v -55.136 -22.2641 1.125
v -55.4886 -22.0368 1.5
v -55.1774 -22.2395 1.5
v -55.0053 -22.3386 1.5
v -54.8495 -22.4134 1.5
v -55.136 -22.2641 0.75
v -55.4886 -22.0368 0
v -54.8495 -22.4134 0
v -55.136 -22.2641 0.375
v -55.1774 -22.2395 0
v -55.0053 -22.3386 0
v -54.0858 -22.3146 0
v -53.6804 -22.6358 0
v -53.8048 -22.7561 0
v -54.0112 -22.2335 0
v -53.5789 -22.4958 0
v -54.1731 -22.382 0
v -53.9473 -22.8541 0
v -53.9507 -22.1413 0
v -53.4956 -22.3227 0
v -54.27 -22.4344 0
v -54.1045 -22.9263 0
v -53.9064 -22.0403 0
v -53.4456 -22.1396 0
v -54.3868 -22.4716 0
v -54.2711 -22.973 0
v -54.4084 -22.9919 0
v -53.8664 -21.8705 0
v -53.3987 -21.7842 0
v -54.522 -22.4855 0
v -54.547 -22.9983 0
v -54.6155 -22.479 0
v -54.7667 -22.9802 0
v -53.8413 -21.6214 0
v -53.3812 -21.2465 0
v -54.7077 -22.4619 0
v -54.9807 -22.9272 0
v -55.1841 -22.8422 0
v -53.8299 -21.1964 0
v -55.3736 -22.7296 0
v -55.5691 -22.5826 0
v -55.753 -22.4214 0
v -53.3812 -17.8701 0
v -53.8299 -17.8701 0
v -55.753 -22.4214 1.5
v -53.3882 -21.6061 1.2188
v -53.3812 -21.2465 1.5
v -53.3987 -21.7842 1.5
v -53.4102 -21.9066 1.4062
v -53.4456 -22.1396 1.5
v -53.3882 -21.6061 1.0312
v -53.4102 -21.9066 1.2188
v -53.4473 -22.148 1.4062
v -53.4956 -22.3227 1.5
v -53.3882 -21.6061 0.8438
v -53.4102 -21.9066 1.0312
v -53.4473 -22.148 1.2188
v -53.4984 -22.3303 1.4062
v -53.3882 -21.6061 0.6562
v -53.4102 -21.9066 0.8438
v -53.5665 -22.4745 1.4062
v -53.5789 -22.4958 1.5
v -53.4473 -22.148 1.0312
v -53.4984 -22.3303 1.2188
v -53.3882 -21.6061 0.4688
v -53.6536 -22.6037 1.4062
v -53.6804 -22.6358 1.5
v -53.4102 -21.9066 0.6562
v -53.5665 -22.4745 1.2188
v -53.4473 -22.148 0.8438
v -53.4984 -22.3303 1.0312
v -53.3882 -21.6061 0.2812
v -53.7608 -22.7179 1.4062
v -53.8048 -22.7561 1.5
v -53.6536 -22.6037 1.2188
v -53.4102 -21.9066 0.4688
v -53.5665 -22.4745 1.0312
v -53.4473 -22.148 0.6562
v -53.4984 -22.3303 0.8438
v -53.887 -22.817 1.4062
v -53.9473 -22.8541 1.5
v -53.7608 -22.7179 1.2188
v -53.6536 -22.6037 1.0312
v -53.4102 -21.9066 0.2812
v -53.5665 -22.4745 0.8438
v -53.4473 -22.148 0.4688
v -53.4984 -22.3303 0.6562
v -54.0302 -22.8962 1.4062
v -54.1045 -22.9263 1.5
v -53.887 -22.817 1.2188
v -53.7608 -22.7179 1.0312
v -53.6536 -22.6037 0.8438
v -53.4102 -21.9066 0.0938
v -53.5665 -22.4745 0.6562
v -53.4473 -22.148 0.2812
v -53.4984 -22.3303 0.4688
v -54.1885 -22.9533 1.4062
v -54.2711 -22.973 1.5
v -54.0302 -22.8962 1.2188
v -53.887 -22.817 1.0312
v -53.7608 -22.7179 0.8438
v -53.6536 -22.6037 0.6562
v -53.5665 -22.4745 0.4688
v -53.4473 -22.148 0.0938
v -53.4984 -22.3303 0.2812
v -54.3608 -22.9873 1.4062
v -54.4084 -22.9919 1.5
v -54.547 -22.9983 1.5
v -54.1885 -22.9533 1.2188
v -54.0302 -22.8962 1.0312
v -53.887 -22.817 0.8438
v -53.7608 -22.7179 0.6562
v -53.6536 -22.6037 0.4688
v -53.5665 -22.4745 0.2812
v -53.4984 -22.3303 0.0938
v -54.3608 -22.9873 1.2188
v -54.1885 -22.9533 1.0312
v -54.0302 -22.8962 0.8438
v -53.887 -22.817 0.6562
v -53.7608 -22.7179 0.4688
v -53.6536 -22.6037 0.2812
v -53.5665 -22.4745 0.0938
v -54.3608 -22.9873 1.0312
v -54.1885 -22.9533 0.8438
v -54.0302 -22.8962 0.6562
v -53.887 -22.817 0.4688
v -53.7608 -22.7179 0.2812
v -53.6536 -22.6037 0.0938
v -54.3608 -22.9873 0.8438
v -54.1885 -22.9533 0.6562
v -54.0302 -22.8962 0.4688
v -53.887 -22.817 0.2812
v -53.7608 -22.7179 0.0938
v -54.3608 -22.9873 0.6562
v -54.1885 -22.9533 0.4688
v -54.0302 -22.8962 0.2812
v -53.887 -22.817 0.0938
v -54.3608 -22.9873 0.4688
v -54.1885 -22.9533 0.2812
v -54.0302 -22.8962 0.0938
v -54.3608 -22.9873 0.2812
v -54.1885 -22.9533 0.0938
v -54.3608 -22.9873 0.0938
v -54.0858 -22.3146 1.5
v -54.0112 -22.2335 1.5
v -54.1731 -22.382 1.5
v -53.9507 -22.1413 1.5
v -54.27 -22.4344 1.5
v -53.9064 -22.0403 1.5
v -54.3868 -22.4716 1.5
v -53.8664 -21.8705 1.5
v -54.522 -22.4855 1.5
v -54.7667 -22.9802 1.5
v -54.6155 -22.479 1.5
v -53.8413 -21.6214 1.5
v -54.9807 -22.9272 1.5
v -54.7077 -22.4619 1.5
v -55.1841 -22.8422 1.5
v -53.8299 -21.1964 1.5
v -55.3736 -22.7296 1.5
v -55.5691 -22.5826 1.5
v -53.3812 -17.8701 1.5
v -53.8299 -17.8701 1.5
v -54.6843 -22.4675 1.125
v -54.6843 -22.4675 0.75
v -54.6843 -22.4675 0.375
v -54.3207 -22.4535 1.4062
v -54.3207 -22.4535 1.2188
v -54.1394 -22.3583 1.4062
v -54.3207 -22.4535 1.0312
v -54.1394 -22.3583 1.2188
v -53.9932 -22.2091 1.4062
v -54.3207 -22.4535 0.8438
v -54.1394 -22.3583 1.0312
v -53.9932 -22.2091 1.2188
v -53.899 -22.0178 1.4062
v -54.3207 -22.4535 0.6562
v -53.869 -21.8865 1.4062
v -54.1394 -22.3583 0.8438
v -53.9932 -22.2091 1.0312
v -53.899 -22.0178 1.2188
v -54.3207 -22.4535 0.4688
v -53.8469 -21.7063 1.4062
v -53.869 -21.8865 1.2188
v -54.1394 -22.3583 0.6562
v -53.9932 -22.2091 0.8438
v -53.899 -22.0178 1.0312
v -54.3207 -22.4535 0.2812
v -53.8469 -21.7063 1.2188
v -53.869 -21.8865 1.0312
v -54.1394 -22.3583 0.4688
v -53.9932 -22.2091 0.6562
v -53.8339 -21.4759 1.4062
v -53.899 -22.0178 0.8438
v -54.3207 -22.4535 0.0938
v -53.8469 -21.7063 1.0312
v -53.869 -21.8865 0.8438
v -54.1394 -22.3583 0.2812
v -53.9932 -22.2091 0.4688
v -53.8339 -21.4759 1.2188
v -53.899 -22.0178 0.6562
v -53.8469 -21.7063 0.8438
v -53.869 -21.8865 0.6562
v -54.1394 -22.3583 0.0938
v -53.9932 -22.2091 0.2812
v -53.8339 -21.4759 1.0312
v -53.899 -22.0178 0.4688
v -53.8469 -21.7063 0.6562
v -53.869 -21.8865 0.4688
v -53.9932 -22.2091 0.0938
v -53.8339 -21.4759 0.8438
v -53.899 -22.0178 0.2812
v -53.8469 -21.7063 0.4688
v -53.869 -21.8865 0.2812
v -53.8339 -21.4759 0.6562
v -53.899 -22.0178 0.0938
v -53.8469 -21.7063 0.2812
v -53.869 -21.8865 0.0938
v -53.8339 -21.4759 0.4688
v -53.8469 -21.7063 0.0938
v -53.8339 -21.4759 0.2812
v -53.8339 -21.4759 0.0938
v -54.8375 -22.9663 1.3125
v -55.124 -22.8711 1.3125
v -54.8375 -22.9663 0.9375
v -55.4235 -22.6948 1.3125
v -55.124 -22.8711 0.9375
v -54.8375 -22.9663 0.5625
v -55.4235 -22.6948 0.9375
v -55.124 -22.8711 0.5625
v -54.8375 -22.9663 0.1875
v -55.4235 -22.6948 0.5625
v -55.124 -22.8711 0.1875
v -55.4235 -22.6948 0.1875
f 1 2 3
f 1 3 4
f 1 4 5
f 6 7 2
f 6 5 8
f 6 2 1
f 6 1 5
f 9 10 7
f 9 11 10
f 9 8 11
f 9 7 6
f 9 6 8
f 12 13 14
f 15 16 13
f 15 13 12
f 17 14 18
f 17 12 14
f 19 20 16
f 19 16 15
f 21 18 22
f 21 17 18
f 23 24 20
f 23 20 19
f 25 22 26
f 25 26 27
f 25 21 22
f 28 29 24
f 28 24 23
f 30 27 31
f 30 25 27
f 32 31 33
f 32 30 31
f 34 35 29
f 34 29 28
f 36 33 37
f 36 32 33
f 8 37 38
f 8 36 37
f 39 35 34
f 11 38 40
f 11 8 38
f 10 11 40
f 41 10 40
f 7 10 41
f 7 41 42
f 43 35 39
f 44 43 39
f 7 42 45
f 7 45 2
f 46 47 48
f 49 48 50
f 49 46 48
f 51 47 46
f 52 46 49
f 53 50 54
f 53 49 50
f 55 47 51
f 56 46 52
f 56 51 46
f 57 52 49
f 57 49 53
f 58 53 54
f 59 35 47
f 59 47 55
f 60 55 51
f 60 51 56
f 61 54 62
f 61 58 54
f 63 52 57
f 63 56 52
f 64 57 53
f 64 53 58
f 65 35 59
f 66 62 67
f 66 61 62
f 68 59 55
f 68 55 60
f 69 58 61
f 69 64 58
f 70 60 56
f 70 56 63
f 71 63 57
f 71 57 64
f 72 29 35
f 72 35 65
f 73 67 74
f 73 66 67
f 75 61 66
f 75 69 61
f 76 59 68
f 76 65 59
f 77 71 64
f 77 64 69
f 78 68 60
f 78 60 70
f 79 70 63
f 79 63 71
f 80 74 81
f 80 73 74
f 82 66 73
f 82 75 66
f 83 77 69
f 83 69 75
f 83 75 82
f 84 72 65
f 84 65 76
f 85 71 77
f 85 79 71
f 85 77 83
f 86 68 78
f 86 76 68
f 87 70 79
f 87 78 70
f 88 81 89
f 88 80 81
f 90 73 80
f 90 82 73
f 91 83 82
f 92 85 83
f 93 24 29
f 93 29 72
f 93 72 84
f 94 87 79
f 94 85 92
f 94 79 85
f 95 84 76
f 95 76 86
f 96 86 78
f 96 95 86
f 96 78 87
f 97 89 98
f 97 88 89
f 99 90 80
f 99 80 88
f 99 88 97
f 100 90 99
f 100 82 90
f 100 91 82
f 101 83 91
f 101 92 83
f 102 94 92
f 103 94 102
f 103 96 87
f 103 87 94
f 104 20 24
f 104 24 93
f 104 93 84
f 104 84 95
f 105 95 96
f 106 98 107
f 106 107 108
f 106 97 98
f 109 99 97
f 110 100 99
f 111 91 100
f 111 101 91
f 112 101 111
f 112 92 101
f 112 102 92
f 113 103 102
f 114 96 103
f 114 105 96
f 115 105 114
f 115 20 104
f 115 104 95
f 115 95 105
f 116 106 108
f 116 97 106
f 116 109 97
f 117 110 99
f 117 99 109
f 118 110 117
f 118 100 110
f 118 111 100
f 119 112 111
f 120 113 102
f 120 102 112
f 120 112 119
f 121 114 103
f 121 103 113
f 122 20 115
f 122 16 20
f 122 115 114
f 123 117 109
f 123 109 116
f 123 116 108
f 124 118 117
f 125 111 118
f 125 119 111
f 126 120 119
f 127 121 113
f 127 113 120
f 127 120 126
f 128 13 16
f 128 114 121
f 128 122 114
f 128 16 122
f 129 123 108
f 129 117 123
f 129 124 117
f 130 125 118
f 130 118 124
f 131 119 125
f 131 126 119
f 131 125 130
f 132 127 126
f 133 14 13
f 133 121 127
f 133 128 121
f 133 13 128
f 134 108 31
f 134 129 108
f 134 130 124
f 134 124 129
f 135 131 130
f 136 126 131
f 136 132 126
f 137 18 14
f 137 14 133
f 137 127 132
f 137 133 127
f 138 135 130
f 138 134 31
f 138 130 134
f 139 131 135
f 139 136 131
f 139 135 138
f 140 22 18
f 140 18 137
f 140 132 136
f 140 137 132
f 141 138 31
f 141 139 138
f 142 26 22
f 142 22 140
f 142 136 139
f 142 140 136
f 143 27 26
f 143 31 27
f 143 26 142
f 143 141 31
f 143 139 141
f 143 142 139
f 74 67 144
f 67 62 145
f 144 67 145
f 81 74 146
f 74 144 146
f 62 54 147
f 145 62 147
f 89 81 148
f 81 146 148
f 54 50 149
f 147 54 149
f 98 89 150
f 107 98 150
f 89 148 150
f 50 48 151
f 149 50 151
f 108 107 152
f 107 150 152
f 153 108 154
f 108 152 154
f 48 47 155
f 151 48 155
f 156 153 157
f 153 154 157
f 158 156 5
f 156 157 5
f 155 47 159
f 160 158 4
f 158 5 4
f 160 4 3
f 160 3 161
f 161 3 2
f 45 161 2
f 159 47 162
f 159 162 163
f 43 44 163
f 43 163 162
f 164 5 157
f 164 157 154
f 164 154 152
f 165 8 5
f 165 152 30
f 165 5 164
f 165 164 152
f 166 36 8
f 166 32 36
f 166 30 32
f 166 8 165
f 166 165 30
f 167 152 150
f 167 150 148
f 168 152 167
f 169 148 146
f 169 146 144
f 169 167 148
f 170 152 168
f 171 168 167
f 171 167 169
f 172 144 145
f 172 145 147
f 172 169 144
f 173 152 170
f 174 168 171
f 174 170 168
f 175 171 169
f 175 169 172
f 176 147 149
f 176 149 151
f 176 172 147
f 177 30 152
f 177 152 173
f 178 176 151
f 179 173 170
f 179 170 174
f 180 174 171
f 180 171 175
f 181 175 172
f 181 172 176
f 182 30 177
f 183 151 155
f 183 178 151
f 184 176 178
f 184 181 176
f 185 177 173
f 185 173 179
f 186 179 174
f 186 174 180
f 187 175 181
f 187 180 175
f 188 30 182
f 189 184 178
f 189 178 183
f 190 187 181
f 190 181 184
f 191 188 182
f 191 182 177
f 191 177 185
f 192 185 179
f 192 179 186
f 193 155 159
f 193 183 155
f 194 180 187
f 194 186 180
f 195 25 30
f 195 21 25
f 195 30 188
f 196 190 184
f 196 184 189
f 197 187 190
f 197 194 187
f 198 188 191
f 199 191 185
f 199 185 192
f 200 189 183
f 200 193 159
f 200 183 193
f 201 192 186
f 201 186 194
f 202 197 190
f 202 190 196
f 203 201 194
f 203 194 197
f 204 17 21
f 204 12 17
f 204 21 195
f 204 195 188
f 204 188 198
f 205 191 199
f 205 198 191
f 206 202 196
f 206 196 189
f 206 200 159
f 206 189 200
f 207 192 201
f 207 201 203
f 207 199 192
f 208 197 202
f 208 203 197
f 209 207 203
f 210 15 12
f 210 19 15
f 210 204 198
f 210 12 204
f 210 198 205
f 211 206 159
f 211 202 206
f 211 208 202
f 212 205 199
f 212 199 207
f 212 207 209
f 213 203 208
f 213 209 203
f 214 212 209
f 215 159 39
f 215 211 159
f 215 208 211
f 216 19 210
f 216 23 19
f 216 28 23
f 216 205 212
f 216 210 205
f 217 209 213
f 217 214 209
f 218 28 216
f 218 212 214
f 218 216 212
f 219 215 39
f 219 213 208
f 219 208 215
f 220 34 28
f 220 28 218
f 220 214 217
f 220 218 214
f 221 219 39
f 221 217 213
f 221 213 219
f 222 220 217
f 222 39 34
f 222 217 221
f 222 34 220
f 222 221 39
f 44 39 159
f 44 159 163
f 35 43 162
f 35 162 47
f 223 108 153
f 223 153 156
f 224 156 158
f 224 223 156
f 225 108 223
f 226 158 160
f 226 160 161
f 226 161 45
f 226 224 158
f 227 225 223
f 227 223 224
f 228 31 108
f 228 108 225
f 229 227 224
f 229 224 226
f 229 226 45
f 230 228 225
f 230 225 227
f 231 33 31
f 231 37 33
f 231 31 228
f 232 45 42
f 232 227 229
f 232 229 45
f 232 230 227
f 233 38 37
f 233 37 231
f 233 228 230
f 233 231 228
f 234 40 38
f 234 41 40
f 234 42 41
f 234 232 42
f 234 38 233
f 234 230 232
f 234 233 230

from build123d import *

# Parameters (mm, degrees)
BOSS_EXTRU_1_DEPTH = 1.5


with BuildPart() as part:
    # Esquisse1 → Boss.-Extru.1 (new body)
    with BuildSketch(Plane.XY):
        with BuildLine():
            Line((-53.829901223, -17.870119076), (-53.381183275, -17.870119076))
            Line((-53.381183275, -17.870119076), (-53.381183275, -21.24652132))
            add(Edge.make_bspline(
                [(-53.381183275, -21.24652132), (-53.38163173, -21.308957278), (-53.382492818, -21.428841937), (-53.387227691, -21.601518931), (-53.395989802, -21.75919134), (-53.408754106, -21.902217693), (-53.42578301, -22.030149915), (-53.445270193, -22.143976512), (-53.468859905, -22.242747486), (-53.504383428, -22.353655137), (-53.562631926, -22.475289144), (-53.650299124, -22.606653645), (-53.759203119, -22.721558517), (-53.885347452, -22.821348124), (-54.029834629, -22.900858455), (-54.189689228, -22.957937281), (-54.36392721, -22.99275279), (-54.484783227, -22.996429798), (-54.547048659, -22.998324204)],
                knots=[0, 0, 0, 0, 1.237770943, 2.376671248, 3.424123796, 4.367912054, 5.222547132, 5.982086412, 6.656319012, 7.234008312, 8.288027371, 9.317870876, 10.352700517, 11.413286737, 12.494591526, 13.606319346, 14.766767577, 16, 16, 16, 16], degree=3))
            add(Edge.make_bspline(
                [(-54.547048659, -22.998324204), (-54.5955606, -22.996780477), (-54.693169837, -22.993674395), (-54.838442278, -22.968357663), (-54.983302243, -22.929334743), (-55.128518599, -22.872188179), (-55.276960372, -22.794465895), (-55.43063801, -22.6927733), (-55.591528283, -22.567299691), (-55.697504406, -22.471531483), (-55.752978146, -22.421401128)],
                knots=[0, 0, 0, 0, 0.848567217, 1.707373443, 2.573483905, 3.470863513, 4.432650262, 5.500696352, 6.691726801, 8, 8, 8, 8], degree=3))
            Line((-55.752978146, -22.421401128), (-55.488555069, -22.036785743))
            add(Edge.make_bspline(
                [(-55.488555069, -22.036785743), (-55.427551242, -22.078853452), (-55.312368062, -22.158282771), (-55.143076004, -22.260463629), (-54.993080071, -22.348071008), (-54.894961575, -22.392717121), (-54.849532634, -22.413388307)],
                knots=[0, 0, 0, 0, 1.196737151, 2.259595785, 3.194191475, 4, 4, 4, 4], degree=3))
            add(Edge.make_bspline(
                [(-54.849532634, -22.413388307), (-54.821983617, -22.424187532), (-54.767953861, -22.445367216), (-54.685346604, -22.469004214), (-54.603210837, -22.481921942), (-54.548756989, -22.484323847), (-54.522008595, -22.485503692)],
                knots=[0, 0, 0, 0, 1.051806502, 2.062826769, 3.048436908, 4, 4, 4, 4], degree=3))
            add(Edge.make_bspline(
                [(-54.522008595, -22.485503692), (-54.487461754, -22.484042642), (-54.419175388, -22.481154685), (-54.319941111, -22.45565572), (-54.225001067, -22.416735144), (-54.137758699, -22.359747582), (-54.057351003, -22.291988409), (-53.991004109, -22.210051254), (-53.93569376, -22.119242706), (-53.902408484, -22.033283486), (-53.881201666, -21.9548883), (-53.867742199, -21.882840963), (-53.855972685, -21.798610279), (-53.845713325, -21.702095707), (-53.839706938, -21.593104019), (-53.832967977, -21.471955243), (-53.83053189, -21.33834394), (-53.83011786, -21.245185437), (-53.829901223, -21.196441192)],
                knots=[0, 0, 0, 0, 0.997221856, 1.971139923, 2.944579524, 3.951425367, 4.971190333, 5.972282193, 6.985401279, 8.033996657, 8.624075553, 9.332086008, 10.151144245, 11.082816738, 12.137127781, 13.306538797, 14.590673636, 16, 16, 16, 16], degree=3))
            Line((-53.829901223, -21.196441192), (-53.829901223, -17.870119076))
        make_face()
    extrude(amount=BOSS_EXTRU_1_DEPTH)


solid = part.part
